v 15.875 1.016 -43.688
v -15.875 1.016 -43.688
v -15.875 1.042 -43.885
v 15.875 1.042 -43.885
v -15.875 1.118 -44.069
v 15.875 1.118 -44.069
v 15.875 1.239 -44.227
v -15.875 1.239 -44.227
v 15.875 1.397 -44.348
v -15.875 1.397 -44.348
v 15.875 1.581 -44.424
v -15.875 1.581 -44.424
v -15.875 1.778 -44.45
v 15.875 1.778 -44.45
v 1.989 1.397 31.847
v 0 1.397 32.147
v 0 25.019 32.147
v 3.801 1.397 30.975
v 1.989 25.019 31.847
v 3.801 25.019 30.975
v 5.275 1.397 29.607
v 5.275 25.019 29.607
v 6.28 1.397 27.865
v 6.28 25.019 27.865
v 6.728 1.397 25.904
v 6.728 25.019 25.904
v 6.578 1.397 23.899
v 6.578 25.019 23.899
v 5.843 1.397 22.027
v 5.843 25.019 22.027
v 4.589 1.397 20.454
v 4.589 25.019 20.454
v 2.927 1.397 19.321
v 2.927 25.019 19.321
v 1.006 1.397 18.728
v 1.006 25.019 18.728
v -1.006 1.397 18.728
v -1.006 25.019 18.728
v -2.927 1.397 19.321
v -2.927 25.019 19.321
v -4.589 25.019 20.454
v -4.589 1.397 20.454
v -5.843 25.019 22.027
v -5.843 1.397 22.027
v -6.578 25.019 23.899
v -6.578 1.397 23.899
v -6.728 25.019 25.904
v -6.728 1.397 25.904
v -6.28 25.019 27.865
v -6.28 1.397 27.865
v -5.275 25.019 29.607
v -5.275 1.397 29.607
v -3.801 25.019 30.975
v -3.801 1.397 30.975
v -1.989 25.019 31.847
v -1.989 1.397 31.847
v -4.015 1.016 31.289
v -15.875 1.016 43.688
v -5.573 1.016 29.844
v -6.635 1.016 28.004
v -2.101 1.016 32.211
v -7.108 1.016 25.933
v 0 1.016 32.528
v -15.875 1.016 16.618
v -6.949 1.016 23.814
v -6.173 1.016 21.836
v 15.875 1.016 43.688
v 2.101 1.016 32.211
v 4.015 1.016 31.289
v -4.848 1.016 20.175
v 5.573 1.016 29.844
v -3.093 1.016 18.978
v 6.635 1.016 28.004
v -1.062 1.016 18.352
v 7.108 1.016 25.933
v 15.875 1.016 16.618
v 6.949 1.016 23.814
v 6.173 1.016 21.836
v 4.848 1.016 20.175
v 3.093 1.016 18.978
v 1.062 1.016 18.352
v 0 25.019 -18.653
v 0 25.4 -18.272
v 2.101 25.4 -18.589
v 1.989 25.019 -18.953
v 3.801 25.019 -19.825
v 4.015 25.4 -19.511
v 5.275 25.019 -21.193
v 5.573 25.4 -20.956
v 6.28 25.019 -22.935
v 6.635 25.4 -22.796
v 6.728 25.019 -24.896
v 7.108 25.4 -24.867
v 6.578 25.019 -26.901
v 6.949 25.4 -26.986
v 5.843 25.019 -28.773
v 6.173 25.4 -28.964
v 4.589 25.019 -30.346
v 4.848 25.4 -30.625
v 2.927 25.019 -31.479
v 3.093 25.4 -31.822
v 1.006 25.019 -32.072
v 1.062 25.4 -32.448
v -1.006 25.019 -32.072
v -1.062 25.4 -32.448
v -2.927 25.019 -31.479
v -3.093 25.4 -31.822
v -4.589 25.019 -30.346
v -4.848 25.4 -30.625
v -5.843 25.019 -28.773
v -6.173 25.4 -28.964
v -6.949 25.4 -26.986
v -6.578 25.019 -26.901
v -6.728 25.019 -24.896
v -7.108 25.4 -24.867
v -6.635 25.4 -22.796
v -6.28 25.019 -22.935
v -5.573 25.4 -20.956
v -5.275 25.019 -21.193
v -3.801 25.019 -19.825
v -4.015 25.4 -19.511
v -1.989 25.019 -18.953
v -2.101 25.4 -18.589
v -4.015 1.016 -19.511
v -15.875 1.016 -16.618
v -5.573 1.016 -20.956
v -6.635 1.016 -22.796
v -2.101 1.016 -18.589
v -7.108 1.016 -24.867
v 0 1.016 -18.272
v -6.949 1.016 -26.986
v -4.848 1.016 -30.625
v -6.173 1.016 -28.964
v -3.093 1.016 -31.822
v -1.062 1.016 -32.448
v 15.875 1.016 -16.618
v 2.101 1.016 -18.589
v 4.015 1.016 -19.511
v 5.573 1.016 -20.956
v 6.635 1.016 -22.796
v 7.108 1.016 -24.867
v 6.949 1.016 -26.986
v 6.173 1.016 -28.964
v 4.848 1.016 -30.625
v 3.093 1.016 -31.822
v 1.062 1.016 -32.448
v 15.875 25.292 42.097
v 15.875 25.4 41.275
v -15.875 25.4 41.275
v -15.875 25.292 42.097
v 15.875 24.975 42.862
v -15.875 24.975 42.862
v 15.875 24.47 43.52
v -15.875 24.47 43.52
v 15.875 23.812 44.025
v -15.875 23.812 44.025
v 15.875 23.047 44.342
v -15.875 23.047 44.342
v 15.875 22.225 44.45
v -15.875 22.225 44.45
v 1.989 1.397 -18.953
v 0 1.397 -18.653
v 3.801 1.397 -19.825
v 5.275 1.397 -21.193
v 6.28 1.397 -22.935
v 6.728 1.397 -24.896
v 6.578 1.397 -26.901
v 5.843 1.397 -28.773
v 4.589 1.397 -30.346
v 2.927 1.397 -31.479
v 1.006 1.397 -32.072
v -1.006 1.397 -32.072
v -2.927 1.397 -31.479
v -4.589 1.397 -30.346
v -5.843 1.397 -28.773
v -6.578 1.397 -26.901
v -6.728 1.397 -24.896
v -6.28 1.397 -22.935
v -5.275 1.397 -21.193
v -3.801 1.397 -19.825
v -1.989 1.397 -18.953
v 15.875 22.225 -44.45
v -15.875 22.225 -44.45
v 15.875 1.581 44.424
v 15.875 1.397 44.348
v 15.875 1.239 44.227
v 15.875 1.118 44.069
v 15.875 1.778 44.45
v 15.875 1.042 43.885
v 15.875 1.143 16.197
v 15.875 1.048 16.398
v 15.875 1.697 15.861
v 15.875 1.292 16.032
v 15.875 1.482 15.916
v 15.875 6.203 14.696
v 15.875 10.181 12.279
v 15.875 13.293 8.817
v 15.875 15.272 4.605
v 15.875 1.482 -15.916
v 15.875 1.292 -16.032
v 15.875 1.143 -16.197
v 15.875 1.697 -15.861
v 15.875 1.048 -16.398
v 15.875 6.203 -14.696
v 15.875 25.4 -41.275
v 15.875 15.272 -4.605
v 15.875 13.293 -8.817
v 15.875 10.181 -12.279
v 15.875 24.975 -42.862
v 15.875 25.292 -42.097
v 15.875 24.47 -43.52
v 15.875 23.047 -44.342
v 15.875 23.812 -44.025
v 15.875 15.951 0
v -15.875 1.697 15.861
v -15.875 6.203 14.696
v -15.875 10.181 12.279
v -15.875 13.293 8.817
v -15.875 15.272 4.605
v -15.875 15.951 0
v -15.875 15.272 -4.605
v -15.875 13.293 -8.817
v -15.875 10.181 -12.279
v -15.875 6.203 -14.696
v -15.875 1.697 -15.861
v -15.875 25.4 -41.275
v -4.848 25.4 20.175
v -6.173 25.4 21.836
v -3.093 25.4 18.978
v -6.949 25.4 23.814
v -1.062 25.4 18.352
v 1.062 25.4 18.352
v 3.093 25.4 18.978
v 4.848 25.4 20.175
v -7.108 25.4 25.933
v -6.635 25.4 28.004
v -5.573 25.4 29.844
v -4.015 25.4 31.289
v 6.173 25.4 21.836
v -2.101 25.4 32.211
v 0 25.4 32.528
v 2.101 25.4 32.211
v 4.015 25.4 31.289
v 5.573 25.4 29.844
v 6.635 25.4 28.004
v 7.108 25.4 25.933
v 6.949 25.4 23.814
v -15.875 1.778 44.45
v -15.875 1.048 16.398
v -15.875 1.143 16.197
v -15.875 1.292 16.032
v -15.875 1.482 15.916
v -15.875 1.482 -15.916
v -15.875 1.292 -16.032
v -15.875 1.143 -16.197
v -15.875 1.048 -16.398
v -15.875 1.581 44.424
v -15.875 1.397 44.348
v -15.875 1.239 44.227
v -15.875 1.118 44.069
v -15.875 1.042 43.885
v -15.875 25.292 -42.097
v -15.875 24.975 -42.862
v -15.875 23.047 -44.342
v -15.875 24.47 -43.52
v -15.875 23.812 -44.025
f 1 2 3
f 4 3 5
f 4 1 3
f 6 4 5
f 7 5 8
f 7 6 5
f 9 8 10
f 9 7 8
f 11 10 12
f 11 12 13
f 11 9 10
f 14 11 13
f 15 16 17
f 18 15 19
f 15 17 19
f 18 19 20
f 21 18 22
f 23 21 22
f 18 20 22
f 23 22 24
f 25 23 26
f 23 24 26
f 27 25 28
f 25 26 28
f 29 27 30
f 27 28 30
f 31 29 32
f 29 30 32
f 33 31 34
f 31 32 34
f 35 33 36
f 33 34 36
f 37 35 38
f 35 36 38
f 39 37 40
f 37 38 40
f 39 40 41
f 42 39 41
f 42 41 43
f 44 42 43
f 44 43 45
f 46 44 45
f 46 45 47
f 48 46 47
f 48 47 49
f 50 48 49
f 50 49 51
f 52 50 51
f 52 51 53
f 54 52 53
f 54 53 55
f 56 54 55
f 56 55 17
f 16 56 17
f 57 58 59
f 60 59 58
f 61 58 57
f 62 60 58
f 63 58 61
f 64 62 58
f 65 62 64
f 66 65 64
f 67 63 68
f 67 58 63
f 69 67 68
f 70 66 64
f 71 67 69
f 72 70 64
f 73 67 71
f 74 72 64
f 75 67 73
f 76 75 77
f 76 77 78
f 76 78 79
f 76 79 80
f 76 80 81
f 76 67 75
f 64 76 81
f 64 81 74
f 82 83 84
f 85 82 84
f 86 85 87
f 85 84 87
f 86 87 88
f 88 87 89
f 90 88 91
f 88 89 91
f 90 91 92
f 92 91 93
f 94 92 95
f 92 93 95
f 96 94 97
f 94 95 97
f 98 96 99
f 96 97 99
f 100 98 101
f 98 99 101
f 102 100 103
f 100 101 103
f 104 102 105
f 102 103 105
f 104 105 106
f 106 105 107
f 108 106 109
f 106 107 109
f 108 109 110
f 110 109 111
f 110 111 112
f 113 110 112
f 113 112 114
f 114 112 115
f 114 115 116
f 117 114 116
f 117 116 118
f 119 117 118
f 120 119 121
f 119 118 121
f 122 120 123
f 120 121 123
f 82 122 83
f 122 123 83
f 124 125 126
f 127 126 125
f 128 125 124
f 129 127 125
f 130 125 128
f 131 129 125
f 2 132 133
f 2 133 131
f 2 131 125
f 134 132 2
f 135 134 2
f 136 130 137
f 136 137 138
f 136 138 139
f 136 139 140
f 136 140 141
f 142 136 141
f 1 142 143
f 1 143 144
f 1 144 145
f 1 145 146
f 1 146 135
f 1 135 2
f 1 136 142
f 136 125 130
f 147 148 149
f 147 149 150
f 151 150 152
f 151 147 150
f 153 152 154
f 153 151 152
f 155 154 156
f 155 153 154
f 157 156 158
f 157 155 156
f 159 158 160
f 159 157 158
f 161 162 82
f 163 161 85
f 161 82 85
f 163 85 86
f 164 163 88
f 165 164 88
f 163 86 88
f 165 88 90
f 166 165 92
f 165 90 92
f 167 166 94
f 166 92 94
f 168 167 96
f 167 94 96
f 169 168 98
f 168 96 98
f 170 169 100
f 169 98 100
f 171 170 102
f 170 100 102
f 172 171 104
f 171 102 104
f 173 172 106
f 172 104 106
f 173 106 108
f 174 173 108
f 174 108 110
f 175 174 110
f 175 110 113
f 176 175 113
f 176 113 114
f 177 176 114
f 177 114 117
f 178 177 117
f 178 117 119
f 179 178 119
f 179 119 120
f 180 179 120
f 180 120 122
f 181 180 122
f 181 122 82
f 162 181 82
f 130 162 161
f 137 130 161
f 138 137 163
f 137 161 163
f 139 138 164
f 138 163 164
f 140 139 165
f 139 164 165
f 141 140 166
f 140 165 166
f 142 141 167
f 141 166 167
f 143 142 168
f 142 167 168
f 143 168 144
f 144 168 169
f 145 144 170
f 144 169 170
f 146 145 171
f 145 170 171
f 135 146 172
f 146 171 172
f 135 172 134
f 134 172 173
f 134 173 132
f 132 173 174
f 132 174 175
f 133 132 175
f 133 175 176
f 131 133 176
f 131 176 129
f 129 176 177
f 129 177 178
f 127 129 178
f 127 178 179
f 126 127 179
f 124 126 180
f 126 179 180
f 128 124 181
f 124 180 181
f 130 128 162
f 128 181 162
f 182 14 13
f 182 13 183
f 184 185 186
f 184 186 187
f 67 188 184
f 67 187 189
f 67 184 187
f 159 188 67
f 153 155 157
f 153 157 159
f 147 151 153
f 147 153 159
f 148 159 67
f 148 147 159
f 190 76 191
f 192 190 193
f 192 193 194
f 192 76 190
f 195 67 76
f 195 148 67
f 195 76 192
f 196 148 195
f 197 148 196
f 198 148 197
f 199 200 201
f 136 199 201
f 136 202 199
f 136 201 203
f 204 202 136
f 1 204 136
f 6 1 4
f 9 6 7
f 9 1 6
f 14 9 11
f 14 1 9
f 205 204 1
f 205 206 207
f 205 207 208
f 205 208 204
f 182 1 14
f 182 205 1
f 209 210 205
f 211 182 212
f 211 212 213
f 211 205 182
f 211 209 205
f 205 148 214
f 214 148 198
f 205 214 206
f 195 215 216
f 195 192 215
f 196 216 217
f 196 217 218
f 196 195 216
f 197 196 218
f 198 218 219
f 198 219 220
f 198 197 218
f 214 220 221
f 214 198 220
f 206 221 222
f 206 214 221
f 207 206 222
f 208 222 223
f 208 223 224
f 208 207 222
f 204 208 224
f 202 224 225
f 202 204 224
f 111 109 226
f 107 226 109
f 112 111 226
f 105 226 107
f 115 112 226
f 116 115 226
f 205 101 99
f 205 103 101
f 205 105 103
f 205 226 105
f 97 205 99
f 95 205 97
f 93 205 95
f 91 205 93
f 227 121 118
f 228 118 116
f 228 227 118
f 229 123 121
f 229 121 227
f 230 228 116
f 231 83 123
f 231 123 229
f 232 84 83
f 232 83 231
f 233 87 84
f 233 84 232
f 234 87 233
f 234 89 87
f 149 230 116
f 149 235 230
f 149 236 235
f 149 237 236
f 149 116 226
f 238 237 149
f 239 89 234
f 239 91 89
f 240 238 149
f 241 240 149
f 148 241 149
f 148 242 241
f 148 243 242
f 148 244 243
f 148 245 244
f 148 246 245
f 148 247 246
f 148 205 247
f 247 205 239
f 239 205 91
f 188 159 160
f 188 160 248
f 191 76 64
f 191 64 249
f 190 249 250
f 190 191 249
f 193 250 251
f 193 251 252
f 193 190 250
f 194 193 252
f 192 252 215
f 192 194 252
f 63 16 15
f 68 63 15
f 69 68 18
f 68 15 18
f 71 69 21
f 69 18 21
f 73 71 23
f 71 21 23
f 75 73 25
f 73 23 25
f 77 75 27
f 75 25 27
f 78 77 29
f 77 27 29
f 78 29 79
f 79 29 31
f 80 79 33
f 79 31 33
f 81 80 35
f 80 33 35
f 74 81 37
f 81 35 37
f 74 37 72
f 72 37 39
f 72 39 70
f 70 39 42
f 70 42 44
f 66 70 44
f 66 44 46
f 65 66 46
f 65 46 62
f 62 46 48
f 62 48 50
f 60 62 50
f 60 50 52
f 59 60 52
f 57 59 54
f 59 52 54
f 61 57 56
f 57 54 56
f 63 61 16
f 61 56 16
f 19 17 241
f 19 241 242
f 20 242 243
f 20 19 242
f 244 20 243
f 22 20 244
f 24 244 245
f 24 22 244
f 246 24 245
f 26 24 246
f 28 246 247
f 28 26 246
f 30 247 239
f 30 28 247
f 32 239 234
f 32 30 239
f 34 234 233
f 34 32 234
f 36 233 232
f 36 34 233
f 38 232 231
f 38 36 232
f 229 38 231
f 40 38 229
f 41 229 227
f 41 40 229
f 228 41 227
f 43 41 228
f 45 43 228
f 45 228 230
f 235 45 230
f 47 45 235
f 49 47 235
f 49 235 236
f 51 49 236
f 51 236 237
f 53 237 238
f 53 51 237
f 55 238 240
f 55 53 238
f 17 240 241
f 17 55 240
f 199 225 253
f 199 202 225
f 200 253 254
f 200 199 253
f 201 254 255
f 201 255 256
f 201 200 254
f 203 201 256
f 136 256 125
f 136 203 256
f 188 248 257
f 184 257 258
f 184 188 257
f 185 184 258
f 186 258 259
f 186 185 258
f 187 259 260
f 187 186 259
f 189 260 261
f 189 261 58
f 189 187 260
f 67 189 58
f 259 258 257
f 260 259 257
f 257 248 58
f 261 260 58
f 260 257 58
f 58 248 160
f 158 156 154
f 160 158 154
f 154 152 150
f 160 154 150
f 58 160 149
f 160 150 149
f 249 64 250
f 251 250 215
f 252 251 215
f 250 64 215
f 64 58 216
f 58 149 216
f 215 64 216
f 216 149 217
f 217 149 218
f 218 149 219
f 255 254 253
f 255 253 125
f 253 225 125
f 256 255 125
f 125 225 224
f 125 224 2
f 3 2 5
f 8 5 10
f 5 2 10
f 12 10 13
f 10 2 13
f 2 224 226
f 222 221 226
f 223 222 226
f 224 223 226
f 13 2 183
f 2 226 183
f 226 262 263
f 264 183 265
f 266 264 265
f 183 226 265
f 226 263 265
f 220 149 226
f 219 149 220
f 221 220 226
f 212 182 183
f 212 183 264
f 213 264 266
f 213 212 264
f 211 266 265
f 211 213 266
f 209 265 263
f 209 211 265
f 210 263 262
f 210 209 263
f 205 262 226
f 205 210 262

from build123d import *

# Parameters (mm, degrees)
BASE_EXTRUDE_DEPTH = 15.875
SKETCH2_R          = 6.746875
CUT_EXTRUDE1_DEPTH = 54.126241924
CHAMFER1_SIZE      = 0.381


with BuildPart() as part:
    # Sketch1 → Base-Extrude (new, symmetric)
    with BuildSketch(Plane(origin=(0, 0, 0), x_dir=(0, 0, -1), z_dir=(1, 0, 0))):
        with BuildLine():
            Line((16.618356424, 1.016), (43.688, 1.016))
            ThreePointArc((43.688, 1.016), (44.226815367, 1.239184633), (44.45, 1.778))
            Line((44.45, 1.778), (44.45, 22.225))
            ThreePointArc((44.45, 22.225), (43.52006403, 24.47006403), (41.275, 25.4))
            Line((41.275, 25.4), (-41.275, 25.4))
            ThreePointArc((-41.275, 25.4), (-43.52006403, 24.47006403), (-44.45, 22.225))
            Line((-44.45, 22.225), (-44.45, 1.778))
            ThreePointArc((-44.45, 1.778), (-44.226815367, 1.239184633), (-43.688, 1.016))
            Line((-43.688, 1.016), (-16.618356424, 1.016))
            ThreePointArc((-16.618356424, 1.016), (-16.109007152, 1.21124845), (-15.860680599, 1.69693617))
            ThreePointArc((-15.860680599, 1.69693617), (0, 15.9512), (15.860680599, 1.69693617))
            ThreePointArc((15.860680599, 1.69693617), (16.109007152, 1.21124845), (16.618356424, 1.016))
        make_face()
    extrude(amount=BASE_EXTRUDE_DEPTH, both=True)

    # Sketch2 → Cut-Extrude1 (cut, through all)
    with BuildSketch(Plane(origin=(0, 25.4, 0), x_dir=(-1, 0, 0), z_dir=(0, 1, 0))):
        with Locations(Location((0, 25.4, 0), (0, 0, 90))):
            Circle(SKETCH2_R)
        with Locations(Location((0, -25.4, 0), (0, 0, 90))):
            Circle(SKETCH2_R)
    extrude(amount=-CUT_EXTRUDE1_DEPTH, mode=Mode.SUBTRACT)

    # Chamfer1
    chamfer1_edges = [part.edges().sort_by_distance(p)[0] for p in [
        (0, 1.016, 18.653125),
        (0, 25.4, 18.653125),
        (0, 1.016, -32.146875),
        (0, 25.4, -32.146875),
    ]]
    chamfer(chamfer1_edges, length=CHAMFER1_SIZE)


solid = part.part
